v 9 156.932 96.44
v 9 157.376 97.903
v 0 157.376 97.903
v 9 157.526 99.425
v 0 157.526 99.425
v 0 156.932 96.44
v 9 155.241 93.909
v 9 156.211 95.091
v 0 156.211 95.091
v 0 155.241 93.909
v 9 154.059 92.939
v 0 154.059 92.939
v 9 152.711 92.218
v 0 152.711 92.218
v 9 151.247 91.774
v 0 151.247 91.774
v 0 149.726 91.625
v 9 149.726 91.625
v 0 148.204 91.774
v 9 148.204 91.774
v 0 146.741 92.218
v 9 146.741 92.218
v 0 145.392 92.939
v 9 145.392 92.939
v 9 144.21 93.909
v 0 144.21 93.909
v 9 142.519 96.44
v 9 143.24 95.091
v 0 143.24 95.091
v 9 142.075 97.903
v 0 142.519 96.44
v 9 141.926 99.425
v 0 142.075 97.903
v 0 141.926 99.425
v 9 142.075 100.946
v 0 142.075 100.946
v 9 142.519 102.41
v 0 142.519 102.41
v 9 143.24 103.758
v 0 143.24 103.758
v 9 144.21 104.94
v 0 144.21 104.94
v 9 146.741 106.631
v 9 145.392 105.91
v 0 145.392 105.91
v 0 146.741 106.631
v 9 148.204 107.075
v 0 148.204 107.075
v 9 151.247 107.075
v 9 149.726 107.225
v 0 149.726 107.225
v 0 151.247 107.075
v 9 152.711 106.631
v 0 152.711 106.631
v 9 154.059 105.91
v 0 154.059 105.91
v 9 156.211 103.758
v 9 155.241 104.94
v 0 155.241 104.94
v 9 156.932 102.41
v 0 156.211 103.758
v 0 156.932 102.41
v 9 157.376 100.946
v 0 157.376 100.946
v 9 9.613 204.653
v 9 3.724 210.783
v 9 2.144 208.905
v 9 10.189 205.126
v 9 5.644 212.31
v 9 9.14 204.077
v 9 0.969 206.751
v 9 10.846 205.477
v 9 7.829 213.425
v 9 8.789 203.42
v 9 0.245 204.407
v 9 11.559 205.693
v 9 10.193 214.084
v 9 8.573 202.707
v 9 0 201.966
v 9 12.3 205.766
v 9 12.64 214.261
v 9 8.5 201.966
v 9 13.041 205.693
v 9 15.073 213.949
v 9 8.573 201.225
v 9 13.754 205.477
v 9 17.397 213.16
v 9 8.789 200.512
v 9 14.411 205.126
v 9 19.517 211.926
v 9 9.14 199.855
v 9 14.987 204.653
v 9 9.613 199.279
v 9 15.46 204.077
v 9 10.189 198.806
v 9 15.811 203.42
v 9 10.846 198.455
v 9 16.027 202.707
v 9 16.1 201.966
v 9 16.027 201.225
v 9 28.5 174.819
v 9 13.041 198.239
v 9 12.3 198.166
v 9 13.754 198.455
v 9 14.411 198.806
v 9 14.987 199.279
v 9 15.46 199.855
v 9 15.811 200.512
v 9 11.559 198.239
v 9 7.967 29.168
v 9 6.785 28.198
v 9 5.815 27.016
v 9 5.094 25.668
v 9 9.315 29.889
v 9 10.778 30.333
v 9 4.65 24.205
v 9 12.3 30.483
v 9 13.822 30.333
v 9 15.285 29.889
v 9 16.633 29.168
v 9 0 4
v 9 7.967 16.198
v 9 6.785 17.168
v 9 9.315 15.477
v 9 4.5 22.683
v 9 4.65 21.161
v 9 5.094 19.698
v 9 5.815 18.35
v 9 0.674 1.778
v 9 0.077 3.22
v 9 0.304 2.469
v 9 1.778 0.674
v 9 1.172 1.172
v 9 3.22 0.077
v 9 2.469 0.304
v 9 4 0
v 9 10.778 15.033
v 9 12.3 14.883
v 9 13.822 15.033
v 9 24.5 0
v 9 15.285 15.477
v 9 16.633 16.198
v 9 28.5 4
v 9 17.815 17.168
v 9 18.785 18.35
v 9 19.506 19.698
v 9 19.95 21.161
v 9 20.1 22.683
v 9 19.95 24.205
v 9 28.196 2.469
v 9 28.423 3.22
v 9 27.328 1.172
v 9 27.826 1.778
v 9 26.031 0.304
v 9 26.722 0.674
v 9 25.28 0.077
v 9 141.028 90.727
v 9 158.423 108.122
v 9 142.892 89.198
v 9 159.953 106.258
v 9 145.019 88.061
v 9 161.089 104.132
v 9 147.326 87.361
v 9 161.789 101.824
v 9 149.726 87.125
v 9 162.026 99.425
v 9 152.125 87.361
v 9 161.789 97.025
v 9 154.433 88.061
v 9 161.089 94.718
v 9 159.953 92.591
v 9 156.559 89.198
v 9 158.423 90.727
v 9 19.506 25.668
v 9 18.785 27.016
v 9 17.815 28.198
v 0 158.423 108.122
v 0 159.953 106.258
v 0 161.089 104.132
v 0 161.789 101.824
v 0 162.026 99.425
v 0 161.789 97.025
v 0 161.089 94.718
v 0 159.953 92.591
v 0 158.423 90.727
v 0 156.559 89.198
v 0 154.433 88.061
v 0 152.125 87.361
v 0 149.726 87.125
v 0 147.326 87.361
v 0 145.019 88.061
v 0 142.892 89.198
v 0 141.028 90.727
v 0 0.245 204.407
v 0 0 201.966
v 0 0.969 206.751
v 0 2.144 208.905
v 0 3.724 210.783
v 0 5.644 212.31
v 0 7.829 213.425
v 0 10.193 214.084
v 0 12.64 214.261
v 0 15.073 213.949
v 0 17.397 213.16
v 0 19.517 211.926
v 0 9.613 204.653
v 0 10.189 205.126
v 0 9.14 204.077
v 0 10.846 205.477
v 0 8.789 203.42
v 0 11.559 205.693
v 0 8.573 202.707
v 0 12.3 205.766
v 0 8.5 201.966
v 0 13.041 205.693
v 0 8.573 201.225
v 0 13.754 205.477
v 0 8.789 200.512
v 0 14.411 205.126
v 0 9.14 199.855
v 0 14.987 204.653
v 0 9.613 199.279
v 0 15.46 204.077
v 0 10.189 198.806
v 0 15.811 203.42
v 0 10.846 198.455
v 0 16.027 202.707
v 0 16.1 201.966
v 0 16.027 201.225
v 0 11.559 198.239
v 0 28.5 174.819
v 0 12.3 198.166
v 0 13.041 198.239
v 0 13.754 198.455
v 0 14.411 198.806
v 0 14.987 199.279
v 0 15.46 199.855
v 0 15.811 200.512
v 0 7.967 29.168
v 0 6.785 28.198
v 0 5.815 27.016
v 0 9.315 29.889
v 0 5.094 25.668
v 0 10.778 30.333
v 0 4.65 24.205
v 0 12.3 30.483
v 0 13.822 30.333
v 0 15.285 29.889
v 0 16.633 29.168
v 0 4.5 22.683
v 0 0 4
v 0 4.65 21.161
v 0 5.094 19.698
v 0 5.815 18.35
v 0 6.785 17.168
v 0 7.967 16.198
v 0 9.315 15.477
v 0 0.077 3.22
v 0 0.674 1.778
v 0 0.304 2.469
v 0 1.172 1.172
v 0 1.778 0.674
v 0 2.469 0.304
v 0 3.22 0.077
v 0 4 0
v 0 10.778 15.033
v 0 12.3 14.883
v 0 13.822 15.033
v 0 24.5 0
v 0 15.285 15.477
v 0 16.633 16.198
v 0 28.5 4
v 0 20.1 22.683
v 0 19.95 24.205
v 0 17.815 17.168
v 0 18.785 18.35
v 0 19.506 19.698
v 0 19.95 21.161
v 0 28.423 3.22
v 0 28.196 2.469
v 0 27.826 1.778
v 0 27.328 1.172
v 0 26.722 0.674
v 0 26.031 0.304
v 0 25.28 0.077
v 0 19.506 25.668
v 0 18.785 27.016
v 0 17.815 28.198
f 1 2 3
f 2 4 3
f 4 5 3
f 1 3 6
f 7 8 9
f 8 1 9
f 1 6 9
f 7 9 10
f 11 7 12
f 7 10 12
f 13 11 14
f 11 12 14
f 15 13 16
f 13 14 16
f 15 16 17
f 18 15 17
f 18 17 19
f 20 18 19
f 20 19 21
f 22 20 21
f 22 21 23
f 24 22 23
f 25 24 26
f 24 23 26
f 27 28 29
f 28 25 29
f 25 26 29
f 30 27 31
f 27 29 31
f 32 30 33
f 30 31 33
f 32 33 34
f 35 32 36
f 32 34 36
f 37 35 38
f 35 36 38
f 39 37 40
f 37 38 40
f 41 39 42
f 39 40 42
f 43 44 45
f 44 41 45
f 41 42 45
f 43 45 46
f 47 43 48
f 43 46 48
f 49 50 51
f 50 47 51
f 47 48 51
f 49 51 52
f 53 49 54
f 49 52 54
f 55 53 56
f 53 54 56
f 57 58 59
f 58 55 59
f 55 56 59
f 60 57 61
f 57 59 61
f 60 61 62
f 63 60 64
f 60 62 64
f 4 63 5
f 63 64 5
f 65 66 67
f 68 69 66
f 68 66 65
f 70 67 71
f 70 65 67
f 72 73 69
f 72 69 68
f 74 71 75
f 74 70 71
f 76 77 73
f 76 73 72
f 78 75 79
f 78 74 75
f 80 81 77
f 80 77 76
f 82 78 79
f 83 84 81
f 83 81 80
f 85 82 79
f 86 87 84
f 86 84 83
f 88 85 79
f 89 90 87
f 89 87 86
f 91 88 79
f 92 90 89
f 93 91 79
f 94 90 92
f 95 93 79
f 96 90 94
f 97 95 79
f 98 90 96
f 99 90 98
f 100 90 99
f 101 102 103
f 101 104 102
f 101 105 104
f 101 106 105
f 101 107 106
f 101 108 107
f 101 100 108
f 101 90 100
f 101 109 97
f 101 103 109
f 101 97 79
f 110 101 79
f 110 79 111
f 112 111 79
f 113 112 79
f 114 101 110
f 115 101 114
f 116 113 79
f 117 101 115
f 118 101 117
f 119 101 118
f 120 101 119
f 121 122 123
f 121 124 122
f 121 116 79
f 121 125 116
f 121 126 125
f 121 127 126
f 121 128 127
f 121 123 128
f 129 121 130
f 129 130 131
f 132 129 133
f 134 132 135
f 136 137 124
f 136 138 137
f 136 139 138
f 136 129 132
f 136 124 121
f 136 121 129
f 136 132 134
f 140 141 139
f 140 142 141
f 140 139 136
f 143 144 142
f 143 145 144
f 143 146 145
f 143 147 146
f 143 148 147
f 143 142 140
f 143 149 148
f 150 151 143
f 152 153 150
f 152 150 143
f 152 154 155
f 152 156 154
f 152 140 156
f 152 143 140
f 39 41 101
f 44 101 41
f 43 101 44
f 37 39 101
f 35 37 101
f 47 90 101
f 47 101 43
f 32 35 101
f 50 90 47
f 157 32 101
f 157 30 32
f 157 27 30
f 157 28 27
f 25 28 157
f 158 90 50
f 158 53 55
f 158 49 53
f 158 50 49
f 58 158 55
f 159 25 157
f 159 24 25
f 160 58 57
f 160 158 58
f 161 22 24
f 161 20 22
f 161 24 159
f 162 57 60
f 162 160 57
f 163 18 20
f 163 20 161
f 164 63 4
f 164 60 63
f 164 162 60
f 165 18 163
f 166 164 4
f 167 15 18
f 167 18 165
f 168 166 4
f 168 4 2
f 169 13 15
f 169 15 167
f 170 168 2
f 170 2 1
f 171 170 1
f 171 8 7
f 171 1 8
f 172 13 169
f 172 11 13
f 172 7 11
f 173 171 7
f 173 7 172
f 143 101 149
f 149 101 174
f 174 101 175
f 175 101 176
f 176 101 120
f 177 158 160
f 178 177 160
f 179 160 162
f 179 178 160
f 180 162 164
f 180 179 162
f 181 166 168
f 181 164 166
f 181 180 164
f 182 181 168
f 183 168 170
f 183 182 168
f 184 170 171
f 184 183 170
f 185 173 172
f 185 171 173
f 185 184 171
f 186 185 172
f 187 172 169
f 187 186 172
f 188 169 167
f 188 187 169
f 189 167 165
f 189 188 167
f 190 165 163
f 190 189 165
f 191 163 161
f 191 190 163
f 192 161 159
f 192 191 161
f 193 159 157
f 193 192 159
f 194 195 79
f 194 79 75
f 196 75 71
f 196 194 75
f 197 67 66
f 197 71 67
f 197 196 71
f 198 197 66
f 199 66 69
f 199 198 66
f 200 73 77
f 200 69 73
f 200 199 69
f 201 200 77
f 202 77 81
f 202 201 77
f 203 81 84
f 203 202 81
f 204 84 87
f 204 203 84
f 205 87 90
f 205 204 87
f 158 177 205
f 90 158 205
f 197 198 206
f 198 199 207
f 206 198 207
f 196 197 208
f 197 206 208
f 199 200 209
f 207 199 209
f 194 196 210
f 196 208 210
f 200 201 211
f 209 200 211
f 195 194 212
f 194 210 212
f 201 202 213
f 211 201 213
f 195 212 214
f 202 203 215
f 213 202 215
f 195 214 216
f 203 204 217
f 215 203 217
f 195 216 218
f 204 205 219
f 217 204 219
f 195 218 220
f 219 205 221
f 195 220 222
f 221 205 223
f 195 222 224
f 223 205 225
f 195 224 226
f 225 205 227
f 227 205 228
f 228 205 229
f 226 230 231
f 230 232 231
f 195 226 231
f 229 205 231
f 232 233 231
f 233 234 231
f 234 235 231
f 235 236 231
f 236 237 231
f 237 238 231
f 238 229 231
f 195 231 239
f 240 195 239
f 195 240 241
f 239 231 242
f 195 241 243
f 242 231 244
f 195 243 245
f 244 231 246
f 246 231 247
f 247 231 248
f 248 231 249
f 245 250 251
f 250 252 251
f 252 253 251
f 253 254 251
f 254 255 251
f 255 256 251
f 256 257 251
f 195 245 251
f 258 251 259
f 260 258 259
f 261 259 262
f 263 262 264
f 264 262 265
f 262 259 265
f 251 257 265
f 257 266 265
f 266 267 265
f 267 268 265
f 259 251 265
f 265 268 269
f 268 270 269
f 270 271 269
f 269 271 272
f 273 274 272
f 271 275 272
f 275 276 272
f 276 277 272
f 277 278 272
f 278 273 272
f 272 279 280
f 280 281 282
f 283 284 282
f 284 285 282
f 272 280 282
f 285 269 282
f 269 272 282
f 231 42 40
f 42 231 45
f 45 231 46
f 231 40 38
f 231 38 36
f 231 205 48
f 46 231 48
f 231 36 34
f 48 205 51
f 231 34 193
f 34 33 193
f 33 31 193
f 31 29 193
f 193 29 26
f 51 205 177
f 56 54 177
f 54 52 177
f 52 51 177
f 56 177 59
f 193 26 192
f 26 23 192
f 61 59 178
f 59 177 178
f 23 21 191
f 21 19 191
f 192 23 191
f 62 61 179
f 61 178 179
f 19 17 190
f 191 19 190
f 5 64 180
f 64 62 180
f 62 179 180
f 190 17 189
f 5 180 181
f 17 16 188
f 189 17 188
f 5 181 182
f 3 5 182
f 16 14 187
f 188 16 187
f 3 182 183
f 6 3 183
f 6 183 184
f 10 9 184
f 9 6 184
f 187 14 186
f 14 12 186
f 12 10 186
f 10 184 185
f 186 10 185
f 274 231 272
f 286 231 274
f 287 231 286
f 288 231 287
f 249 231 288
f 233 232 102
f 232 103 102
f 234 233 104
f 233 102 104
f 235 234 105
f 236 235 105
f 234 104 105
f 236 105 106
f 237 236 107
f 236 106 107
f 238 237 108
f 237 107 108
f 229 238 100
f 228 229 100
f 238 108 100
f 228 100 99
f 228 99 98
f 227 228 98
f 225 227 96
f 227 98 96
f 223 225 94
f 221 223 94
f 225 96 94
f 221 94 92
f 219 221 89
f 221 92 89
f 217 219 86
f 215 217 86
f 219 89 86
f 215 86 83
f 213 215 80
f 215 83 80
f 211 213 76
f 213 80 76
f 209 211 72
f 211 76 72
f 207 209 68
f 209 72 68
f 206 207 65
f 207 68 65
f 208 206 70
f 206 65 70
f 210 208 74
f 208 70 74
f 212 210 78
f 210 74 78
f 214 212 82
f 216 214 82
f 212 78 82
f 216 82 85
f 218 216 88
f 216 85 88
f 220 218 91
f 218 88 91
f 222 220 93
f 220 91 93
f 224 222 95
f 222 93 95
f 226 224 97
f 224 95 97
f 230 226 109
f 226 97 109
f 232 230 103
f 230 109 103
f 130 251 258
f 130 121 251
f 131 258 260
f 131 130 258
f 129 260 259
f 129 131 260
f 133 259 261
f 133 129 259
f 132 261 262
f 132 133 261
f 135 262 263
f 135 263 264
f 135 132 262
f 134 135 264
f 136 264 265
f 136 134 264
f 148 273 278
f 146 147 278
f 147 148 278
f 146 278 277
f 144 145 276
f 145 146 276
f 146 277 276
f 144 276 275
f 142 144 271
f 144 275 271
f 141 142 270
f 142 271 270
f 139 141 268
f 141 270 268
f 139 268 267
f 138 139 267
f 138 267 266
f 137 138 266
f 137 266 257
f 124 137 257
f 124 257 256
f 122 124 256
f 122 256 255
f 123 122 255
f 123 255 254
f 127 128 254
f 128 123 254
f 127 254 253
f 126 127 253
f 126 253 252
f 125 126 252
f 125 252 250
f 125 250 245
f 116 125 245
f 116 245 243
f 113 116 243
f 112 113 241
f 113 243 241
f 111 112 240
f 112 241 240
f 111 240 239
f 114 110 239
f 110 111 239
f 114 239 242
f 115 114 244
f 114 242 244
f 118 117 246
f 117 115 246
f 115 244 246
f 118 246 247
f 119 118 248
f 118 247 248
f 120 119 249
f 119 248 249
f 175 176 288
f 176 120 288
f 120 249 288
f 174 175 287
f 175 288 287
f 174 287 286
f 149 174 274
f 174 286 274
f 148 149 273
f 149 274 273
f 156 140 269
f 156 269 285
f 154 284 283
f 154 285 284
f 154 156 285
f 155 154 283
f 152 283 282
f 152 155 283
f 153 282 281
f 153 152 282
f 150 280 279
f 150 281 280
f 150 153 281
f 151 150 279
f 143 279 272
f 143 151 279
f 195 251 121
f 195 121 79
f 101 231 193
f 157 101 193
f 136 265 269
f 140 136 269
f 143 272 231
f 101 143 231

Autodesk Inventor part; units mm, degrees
ref_plane "YZ Plane" through (0, 0, 0) normal (1, 0, 0) x (0, 1, 0)
ref_plane "XZ Plane" through (0, 0, 0) normal (0, 1, 0) x (-1, 0, 0)
ref_plane "XY Plane" through (0, 0, 0) normal (0, 0, 1) x (1, 0, 0)
sketch "Sketch1" plane through (0, 0, 0) normal (1, 0, 0) x (0, 1, 0)
  line L0 (0, 0) -> (0, 201.966)
  circle A0 centre (12.3, 22.683) radius 7.8
  line L1 (0, 0) -> (16.4683, 0)
  circle A1 centre (12.3, 201.966) radius 7.8
  line L2 (0, 0) -> (28.5, 0)
  line L3 (28.5, 0) -> (28.5, 174.8193)
  line L4 (12.3, 22.683) -> (149.7256, 99.4246) construction
  circle A2 centre (149.7256, 99.4246) radius 7.8
  line L5 (28.5, 174.8193) -> (141.0282, 90.7272)
  arc A3 (141.0282, 90.7272) -> (158.423, 108.122) centre (149.7256, 99.4246) ccw
  line L6 (149.7256, 99.4246) -> (158.423, 108.122) construction
  line L7 (149.7256, 99.4246) -> (141.0282, 90.7272) construction
  line L8 (158.423, 108.122) -> (19.517, 211.9262)
  arc A4 (19.517, 211.9262) -> (0, 201.966) centre (12.3, 201.966) ccw
  dimension "d0" = 201.966
  dimension "d1" = 22.683
  dimension "d2" = 12.3
  dimension "d5" = 28.5
  dimension "d6" = 157.401
  dimension "d7" = 119.18
  dimension "d8" = 15.6
  dimension "d10" = 180
  dimension "d11" = 12.3
  dimension "d12" = 12.3
  dimension "d13" = 9.9602
extrude "Extrusion1" add sketch "Sketch1" along normal blind 9
fillet "Fillet1" radius 4 2 edges at (4.5, 28.5, 0) (4.5, 0, 0)
sketch "Sketch2" plane through (9, 0, 0) normal (1, 0, 0) x (0, 0, -1)
  circle A0 centre (-201.966, 12.3) radius 7.8 projected
  circle A1 centre (-201.966, 12.3) radius 3.8
  point P0 (0, 0)
  dimension "d17" = 15.6
  dimension "d18" = 7.6
extrude "Extrusion2" add sketch "Sketch2" against normal blind 9
equation "\"d2\" = altura_hoyo"
equation "\"d6\" = d_entre_ejes"
equation "\"d12\" = d11"
equation "\"altura_hoyo\" = 12.3"
equation "\"d_entre_ejes\" = 157.401"
properties part number "Marco_trasero_triciclo" material "Aluminum 6061"
